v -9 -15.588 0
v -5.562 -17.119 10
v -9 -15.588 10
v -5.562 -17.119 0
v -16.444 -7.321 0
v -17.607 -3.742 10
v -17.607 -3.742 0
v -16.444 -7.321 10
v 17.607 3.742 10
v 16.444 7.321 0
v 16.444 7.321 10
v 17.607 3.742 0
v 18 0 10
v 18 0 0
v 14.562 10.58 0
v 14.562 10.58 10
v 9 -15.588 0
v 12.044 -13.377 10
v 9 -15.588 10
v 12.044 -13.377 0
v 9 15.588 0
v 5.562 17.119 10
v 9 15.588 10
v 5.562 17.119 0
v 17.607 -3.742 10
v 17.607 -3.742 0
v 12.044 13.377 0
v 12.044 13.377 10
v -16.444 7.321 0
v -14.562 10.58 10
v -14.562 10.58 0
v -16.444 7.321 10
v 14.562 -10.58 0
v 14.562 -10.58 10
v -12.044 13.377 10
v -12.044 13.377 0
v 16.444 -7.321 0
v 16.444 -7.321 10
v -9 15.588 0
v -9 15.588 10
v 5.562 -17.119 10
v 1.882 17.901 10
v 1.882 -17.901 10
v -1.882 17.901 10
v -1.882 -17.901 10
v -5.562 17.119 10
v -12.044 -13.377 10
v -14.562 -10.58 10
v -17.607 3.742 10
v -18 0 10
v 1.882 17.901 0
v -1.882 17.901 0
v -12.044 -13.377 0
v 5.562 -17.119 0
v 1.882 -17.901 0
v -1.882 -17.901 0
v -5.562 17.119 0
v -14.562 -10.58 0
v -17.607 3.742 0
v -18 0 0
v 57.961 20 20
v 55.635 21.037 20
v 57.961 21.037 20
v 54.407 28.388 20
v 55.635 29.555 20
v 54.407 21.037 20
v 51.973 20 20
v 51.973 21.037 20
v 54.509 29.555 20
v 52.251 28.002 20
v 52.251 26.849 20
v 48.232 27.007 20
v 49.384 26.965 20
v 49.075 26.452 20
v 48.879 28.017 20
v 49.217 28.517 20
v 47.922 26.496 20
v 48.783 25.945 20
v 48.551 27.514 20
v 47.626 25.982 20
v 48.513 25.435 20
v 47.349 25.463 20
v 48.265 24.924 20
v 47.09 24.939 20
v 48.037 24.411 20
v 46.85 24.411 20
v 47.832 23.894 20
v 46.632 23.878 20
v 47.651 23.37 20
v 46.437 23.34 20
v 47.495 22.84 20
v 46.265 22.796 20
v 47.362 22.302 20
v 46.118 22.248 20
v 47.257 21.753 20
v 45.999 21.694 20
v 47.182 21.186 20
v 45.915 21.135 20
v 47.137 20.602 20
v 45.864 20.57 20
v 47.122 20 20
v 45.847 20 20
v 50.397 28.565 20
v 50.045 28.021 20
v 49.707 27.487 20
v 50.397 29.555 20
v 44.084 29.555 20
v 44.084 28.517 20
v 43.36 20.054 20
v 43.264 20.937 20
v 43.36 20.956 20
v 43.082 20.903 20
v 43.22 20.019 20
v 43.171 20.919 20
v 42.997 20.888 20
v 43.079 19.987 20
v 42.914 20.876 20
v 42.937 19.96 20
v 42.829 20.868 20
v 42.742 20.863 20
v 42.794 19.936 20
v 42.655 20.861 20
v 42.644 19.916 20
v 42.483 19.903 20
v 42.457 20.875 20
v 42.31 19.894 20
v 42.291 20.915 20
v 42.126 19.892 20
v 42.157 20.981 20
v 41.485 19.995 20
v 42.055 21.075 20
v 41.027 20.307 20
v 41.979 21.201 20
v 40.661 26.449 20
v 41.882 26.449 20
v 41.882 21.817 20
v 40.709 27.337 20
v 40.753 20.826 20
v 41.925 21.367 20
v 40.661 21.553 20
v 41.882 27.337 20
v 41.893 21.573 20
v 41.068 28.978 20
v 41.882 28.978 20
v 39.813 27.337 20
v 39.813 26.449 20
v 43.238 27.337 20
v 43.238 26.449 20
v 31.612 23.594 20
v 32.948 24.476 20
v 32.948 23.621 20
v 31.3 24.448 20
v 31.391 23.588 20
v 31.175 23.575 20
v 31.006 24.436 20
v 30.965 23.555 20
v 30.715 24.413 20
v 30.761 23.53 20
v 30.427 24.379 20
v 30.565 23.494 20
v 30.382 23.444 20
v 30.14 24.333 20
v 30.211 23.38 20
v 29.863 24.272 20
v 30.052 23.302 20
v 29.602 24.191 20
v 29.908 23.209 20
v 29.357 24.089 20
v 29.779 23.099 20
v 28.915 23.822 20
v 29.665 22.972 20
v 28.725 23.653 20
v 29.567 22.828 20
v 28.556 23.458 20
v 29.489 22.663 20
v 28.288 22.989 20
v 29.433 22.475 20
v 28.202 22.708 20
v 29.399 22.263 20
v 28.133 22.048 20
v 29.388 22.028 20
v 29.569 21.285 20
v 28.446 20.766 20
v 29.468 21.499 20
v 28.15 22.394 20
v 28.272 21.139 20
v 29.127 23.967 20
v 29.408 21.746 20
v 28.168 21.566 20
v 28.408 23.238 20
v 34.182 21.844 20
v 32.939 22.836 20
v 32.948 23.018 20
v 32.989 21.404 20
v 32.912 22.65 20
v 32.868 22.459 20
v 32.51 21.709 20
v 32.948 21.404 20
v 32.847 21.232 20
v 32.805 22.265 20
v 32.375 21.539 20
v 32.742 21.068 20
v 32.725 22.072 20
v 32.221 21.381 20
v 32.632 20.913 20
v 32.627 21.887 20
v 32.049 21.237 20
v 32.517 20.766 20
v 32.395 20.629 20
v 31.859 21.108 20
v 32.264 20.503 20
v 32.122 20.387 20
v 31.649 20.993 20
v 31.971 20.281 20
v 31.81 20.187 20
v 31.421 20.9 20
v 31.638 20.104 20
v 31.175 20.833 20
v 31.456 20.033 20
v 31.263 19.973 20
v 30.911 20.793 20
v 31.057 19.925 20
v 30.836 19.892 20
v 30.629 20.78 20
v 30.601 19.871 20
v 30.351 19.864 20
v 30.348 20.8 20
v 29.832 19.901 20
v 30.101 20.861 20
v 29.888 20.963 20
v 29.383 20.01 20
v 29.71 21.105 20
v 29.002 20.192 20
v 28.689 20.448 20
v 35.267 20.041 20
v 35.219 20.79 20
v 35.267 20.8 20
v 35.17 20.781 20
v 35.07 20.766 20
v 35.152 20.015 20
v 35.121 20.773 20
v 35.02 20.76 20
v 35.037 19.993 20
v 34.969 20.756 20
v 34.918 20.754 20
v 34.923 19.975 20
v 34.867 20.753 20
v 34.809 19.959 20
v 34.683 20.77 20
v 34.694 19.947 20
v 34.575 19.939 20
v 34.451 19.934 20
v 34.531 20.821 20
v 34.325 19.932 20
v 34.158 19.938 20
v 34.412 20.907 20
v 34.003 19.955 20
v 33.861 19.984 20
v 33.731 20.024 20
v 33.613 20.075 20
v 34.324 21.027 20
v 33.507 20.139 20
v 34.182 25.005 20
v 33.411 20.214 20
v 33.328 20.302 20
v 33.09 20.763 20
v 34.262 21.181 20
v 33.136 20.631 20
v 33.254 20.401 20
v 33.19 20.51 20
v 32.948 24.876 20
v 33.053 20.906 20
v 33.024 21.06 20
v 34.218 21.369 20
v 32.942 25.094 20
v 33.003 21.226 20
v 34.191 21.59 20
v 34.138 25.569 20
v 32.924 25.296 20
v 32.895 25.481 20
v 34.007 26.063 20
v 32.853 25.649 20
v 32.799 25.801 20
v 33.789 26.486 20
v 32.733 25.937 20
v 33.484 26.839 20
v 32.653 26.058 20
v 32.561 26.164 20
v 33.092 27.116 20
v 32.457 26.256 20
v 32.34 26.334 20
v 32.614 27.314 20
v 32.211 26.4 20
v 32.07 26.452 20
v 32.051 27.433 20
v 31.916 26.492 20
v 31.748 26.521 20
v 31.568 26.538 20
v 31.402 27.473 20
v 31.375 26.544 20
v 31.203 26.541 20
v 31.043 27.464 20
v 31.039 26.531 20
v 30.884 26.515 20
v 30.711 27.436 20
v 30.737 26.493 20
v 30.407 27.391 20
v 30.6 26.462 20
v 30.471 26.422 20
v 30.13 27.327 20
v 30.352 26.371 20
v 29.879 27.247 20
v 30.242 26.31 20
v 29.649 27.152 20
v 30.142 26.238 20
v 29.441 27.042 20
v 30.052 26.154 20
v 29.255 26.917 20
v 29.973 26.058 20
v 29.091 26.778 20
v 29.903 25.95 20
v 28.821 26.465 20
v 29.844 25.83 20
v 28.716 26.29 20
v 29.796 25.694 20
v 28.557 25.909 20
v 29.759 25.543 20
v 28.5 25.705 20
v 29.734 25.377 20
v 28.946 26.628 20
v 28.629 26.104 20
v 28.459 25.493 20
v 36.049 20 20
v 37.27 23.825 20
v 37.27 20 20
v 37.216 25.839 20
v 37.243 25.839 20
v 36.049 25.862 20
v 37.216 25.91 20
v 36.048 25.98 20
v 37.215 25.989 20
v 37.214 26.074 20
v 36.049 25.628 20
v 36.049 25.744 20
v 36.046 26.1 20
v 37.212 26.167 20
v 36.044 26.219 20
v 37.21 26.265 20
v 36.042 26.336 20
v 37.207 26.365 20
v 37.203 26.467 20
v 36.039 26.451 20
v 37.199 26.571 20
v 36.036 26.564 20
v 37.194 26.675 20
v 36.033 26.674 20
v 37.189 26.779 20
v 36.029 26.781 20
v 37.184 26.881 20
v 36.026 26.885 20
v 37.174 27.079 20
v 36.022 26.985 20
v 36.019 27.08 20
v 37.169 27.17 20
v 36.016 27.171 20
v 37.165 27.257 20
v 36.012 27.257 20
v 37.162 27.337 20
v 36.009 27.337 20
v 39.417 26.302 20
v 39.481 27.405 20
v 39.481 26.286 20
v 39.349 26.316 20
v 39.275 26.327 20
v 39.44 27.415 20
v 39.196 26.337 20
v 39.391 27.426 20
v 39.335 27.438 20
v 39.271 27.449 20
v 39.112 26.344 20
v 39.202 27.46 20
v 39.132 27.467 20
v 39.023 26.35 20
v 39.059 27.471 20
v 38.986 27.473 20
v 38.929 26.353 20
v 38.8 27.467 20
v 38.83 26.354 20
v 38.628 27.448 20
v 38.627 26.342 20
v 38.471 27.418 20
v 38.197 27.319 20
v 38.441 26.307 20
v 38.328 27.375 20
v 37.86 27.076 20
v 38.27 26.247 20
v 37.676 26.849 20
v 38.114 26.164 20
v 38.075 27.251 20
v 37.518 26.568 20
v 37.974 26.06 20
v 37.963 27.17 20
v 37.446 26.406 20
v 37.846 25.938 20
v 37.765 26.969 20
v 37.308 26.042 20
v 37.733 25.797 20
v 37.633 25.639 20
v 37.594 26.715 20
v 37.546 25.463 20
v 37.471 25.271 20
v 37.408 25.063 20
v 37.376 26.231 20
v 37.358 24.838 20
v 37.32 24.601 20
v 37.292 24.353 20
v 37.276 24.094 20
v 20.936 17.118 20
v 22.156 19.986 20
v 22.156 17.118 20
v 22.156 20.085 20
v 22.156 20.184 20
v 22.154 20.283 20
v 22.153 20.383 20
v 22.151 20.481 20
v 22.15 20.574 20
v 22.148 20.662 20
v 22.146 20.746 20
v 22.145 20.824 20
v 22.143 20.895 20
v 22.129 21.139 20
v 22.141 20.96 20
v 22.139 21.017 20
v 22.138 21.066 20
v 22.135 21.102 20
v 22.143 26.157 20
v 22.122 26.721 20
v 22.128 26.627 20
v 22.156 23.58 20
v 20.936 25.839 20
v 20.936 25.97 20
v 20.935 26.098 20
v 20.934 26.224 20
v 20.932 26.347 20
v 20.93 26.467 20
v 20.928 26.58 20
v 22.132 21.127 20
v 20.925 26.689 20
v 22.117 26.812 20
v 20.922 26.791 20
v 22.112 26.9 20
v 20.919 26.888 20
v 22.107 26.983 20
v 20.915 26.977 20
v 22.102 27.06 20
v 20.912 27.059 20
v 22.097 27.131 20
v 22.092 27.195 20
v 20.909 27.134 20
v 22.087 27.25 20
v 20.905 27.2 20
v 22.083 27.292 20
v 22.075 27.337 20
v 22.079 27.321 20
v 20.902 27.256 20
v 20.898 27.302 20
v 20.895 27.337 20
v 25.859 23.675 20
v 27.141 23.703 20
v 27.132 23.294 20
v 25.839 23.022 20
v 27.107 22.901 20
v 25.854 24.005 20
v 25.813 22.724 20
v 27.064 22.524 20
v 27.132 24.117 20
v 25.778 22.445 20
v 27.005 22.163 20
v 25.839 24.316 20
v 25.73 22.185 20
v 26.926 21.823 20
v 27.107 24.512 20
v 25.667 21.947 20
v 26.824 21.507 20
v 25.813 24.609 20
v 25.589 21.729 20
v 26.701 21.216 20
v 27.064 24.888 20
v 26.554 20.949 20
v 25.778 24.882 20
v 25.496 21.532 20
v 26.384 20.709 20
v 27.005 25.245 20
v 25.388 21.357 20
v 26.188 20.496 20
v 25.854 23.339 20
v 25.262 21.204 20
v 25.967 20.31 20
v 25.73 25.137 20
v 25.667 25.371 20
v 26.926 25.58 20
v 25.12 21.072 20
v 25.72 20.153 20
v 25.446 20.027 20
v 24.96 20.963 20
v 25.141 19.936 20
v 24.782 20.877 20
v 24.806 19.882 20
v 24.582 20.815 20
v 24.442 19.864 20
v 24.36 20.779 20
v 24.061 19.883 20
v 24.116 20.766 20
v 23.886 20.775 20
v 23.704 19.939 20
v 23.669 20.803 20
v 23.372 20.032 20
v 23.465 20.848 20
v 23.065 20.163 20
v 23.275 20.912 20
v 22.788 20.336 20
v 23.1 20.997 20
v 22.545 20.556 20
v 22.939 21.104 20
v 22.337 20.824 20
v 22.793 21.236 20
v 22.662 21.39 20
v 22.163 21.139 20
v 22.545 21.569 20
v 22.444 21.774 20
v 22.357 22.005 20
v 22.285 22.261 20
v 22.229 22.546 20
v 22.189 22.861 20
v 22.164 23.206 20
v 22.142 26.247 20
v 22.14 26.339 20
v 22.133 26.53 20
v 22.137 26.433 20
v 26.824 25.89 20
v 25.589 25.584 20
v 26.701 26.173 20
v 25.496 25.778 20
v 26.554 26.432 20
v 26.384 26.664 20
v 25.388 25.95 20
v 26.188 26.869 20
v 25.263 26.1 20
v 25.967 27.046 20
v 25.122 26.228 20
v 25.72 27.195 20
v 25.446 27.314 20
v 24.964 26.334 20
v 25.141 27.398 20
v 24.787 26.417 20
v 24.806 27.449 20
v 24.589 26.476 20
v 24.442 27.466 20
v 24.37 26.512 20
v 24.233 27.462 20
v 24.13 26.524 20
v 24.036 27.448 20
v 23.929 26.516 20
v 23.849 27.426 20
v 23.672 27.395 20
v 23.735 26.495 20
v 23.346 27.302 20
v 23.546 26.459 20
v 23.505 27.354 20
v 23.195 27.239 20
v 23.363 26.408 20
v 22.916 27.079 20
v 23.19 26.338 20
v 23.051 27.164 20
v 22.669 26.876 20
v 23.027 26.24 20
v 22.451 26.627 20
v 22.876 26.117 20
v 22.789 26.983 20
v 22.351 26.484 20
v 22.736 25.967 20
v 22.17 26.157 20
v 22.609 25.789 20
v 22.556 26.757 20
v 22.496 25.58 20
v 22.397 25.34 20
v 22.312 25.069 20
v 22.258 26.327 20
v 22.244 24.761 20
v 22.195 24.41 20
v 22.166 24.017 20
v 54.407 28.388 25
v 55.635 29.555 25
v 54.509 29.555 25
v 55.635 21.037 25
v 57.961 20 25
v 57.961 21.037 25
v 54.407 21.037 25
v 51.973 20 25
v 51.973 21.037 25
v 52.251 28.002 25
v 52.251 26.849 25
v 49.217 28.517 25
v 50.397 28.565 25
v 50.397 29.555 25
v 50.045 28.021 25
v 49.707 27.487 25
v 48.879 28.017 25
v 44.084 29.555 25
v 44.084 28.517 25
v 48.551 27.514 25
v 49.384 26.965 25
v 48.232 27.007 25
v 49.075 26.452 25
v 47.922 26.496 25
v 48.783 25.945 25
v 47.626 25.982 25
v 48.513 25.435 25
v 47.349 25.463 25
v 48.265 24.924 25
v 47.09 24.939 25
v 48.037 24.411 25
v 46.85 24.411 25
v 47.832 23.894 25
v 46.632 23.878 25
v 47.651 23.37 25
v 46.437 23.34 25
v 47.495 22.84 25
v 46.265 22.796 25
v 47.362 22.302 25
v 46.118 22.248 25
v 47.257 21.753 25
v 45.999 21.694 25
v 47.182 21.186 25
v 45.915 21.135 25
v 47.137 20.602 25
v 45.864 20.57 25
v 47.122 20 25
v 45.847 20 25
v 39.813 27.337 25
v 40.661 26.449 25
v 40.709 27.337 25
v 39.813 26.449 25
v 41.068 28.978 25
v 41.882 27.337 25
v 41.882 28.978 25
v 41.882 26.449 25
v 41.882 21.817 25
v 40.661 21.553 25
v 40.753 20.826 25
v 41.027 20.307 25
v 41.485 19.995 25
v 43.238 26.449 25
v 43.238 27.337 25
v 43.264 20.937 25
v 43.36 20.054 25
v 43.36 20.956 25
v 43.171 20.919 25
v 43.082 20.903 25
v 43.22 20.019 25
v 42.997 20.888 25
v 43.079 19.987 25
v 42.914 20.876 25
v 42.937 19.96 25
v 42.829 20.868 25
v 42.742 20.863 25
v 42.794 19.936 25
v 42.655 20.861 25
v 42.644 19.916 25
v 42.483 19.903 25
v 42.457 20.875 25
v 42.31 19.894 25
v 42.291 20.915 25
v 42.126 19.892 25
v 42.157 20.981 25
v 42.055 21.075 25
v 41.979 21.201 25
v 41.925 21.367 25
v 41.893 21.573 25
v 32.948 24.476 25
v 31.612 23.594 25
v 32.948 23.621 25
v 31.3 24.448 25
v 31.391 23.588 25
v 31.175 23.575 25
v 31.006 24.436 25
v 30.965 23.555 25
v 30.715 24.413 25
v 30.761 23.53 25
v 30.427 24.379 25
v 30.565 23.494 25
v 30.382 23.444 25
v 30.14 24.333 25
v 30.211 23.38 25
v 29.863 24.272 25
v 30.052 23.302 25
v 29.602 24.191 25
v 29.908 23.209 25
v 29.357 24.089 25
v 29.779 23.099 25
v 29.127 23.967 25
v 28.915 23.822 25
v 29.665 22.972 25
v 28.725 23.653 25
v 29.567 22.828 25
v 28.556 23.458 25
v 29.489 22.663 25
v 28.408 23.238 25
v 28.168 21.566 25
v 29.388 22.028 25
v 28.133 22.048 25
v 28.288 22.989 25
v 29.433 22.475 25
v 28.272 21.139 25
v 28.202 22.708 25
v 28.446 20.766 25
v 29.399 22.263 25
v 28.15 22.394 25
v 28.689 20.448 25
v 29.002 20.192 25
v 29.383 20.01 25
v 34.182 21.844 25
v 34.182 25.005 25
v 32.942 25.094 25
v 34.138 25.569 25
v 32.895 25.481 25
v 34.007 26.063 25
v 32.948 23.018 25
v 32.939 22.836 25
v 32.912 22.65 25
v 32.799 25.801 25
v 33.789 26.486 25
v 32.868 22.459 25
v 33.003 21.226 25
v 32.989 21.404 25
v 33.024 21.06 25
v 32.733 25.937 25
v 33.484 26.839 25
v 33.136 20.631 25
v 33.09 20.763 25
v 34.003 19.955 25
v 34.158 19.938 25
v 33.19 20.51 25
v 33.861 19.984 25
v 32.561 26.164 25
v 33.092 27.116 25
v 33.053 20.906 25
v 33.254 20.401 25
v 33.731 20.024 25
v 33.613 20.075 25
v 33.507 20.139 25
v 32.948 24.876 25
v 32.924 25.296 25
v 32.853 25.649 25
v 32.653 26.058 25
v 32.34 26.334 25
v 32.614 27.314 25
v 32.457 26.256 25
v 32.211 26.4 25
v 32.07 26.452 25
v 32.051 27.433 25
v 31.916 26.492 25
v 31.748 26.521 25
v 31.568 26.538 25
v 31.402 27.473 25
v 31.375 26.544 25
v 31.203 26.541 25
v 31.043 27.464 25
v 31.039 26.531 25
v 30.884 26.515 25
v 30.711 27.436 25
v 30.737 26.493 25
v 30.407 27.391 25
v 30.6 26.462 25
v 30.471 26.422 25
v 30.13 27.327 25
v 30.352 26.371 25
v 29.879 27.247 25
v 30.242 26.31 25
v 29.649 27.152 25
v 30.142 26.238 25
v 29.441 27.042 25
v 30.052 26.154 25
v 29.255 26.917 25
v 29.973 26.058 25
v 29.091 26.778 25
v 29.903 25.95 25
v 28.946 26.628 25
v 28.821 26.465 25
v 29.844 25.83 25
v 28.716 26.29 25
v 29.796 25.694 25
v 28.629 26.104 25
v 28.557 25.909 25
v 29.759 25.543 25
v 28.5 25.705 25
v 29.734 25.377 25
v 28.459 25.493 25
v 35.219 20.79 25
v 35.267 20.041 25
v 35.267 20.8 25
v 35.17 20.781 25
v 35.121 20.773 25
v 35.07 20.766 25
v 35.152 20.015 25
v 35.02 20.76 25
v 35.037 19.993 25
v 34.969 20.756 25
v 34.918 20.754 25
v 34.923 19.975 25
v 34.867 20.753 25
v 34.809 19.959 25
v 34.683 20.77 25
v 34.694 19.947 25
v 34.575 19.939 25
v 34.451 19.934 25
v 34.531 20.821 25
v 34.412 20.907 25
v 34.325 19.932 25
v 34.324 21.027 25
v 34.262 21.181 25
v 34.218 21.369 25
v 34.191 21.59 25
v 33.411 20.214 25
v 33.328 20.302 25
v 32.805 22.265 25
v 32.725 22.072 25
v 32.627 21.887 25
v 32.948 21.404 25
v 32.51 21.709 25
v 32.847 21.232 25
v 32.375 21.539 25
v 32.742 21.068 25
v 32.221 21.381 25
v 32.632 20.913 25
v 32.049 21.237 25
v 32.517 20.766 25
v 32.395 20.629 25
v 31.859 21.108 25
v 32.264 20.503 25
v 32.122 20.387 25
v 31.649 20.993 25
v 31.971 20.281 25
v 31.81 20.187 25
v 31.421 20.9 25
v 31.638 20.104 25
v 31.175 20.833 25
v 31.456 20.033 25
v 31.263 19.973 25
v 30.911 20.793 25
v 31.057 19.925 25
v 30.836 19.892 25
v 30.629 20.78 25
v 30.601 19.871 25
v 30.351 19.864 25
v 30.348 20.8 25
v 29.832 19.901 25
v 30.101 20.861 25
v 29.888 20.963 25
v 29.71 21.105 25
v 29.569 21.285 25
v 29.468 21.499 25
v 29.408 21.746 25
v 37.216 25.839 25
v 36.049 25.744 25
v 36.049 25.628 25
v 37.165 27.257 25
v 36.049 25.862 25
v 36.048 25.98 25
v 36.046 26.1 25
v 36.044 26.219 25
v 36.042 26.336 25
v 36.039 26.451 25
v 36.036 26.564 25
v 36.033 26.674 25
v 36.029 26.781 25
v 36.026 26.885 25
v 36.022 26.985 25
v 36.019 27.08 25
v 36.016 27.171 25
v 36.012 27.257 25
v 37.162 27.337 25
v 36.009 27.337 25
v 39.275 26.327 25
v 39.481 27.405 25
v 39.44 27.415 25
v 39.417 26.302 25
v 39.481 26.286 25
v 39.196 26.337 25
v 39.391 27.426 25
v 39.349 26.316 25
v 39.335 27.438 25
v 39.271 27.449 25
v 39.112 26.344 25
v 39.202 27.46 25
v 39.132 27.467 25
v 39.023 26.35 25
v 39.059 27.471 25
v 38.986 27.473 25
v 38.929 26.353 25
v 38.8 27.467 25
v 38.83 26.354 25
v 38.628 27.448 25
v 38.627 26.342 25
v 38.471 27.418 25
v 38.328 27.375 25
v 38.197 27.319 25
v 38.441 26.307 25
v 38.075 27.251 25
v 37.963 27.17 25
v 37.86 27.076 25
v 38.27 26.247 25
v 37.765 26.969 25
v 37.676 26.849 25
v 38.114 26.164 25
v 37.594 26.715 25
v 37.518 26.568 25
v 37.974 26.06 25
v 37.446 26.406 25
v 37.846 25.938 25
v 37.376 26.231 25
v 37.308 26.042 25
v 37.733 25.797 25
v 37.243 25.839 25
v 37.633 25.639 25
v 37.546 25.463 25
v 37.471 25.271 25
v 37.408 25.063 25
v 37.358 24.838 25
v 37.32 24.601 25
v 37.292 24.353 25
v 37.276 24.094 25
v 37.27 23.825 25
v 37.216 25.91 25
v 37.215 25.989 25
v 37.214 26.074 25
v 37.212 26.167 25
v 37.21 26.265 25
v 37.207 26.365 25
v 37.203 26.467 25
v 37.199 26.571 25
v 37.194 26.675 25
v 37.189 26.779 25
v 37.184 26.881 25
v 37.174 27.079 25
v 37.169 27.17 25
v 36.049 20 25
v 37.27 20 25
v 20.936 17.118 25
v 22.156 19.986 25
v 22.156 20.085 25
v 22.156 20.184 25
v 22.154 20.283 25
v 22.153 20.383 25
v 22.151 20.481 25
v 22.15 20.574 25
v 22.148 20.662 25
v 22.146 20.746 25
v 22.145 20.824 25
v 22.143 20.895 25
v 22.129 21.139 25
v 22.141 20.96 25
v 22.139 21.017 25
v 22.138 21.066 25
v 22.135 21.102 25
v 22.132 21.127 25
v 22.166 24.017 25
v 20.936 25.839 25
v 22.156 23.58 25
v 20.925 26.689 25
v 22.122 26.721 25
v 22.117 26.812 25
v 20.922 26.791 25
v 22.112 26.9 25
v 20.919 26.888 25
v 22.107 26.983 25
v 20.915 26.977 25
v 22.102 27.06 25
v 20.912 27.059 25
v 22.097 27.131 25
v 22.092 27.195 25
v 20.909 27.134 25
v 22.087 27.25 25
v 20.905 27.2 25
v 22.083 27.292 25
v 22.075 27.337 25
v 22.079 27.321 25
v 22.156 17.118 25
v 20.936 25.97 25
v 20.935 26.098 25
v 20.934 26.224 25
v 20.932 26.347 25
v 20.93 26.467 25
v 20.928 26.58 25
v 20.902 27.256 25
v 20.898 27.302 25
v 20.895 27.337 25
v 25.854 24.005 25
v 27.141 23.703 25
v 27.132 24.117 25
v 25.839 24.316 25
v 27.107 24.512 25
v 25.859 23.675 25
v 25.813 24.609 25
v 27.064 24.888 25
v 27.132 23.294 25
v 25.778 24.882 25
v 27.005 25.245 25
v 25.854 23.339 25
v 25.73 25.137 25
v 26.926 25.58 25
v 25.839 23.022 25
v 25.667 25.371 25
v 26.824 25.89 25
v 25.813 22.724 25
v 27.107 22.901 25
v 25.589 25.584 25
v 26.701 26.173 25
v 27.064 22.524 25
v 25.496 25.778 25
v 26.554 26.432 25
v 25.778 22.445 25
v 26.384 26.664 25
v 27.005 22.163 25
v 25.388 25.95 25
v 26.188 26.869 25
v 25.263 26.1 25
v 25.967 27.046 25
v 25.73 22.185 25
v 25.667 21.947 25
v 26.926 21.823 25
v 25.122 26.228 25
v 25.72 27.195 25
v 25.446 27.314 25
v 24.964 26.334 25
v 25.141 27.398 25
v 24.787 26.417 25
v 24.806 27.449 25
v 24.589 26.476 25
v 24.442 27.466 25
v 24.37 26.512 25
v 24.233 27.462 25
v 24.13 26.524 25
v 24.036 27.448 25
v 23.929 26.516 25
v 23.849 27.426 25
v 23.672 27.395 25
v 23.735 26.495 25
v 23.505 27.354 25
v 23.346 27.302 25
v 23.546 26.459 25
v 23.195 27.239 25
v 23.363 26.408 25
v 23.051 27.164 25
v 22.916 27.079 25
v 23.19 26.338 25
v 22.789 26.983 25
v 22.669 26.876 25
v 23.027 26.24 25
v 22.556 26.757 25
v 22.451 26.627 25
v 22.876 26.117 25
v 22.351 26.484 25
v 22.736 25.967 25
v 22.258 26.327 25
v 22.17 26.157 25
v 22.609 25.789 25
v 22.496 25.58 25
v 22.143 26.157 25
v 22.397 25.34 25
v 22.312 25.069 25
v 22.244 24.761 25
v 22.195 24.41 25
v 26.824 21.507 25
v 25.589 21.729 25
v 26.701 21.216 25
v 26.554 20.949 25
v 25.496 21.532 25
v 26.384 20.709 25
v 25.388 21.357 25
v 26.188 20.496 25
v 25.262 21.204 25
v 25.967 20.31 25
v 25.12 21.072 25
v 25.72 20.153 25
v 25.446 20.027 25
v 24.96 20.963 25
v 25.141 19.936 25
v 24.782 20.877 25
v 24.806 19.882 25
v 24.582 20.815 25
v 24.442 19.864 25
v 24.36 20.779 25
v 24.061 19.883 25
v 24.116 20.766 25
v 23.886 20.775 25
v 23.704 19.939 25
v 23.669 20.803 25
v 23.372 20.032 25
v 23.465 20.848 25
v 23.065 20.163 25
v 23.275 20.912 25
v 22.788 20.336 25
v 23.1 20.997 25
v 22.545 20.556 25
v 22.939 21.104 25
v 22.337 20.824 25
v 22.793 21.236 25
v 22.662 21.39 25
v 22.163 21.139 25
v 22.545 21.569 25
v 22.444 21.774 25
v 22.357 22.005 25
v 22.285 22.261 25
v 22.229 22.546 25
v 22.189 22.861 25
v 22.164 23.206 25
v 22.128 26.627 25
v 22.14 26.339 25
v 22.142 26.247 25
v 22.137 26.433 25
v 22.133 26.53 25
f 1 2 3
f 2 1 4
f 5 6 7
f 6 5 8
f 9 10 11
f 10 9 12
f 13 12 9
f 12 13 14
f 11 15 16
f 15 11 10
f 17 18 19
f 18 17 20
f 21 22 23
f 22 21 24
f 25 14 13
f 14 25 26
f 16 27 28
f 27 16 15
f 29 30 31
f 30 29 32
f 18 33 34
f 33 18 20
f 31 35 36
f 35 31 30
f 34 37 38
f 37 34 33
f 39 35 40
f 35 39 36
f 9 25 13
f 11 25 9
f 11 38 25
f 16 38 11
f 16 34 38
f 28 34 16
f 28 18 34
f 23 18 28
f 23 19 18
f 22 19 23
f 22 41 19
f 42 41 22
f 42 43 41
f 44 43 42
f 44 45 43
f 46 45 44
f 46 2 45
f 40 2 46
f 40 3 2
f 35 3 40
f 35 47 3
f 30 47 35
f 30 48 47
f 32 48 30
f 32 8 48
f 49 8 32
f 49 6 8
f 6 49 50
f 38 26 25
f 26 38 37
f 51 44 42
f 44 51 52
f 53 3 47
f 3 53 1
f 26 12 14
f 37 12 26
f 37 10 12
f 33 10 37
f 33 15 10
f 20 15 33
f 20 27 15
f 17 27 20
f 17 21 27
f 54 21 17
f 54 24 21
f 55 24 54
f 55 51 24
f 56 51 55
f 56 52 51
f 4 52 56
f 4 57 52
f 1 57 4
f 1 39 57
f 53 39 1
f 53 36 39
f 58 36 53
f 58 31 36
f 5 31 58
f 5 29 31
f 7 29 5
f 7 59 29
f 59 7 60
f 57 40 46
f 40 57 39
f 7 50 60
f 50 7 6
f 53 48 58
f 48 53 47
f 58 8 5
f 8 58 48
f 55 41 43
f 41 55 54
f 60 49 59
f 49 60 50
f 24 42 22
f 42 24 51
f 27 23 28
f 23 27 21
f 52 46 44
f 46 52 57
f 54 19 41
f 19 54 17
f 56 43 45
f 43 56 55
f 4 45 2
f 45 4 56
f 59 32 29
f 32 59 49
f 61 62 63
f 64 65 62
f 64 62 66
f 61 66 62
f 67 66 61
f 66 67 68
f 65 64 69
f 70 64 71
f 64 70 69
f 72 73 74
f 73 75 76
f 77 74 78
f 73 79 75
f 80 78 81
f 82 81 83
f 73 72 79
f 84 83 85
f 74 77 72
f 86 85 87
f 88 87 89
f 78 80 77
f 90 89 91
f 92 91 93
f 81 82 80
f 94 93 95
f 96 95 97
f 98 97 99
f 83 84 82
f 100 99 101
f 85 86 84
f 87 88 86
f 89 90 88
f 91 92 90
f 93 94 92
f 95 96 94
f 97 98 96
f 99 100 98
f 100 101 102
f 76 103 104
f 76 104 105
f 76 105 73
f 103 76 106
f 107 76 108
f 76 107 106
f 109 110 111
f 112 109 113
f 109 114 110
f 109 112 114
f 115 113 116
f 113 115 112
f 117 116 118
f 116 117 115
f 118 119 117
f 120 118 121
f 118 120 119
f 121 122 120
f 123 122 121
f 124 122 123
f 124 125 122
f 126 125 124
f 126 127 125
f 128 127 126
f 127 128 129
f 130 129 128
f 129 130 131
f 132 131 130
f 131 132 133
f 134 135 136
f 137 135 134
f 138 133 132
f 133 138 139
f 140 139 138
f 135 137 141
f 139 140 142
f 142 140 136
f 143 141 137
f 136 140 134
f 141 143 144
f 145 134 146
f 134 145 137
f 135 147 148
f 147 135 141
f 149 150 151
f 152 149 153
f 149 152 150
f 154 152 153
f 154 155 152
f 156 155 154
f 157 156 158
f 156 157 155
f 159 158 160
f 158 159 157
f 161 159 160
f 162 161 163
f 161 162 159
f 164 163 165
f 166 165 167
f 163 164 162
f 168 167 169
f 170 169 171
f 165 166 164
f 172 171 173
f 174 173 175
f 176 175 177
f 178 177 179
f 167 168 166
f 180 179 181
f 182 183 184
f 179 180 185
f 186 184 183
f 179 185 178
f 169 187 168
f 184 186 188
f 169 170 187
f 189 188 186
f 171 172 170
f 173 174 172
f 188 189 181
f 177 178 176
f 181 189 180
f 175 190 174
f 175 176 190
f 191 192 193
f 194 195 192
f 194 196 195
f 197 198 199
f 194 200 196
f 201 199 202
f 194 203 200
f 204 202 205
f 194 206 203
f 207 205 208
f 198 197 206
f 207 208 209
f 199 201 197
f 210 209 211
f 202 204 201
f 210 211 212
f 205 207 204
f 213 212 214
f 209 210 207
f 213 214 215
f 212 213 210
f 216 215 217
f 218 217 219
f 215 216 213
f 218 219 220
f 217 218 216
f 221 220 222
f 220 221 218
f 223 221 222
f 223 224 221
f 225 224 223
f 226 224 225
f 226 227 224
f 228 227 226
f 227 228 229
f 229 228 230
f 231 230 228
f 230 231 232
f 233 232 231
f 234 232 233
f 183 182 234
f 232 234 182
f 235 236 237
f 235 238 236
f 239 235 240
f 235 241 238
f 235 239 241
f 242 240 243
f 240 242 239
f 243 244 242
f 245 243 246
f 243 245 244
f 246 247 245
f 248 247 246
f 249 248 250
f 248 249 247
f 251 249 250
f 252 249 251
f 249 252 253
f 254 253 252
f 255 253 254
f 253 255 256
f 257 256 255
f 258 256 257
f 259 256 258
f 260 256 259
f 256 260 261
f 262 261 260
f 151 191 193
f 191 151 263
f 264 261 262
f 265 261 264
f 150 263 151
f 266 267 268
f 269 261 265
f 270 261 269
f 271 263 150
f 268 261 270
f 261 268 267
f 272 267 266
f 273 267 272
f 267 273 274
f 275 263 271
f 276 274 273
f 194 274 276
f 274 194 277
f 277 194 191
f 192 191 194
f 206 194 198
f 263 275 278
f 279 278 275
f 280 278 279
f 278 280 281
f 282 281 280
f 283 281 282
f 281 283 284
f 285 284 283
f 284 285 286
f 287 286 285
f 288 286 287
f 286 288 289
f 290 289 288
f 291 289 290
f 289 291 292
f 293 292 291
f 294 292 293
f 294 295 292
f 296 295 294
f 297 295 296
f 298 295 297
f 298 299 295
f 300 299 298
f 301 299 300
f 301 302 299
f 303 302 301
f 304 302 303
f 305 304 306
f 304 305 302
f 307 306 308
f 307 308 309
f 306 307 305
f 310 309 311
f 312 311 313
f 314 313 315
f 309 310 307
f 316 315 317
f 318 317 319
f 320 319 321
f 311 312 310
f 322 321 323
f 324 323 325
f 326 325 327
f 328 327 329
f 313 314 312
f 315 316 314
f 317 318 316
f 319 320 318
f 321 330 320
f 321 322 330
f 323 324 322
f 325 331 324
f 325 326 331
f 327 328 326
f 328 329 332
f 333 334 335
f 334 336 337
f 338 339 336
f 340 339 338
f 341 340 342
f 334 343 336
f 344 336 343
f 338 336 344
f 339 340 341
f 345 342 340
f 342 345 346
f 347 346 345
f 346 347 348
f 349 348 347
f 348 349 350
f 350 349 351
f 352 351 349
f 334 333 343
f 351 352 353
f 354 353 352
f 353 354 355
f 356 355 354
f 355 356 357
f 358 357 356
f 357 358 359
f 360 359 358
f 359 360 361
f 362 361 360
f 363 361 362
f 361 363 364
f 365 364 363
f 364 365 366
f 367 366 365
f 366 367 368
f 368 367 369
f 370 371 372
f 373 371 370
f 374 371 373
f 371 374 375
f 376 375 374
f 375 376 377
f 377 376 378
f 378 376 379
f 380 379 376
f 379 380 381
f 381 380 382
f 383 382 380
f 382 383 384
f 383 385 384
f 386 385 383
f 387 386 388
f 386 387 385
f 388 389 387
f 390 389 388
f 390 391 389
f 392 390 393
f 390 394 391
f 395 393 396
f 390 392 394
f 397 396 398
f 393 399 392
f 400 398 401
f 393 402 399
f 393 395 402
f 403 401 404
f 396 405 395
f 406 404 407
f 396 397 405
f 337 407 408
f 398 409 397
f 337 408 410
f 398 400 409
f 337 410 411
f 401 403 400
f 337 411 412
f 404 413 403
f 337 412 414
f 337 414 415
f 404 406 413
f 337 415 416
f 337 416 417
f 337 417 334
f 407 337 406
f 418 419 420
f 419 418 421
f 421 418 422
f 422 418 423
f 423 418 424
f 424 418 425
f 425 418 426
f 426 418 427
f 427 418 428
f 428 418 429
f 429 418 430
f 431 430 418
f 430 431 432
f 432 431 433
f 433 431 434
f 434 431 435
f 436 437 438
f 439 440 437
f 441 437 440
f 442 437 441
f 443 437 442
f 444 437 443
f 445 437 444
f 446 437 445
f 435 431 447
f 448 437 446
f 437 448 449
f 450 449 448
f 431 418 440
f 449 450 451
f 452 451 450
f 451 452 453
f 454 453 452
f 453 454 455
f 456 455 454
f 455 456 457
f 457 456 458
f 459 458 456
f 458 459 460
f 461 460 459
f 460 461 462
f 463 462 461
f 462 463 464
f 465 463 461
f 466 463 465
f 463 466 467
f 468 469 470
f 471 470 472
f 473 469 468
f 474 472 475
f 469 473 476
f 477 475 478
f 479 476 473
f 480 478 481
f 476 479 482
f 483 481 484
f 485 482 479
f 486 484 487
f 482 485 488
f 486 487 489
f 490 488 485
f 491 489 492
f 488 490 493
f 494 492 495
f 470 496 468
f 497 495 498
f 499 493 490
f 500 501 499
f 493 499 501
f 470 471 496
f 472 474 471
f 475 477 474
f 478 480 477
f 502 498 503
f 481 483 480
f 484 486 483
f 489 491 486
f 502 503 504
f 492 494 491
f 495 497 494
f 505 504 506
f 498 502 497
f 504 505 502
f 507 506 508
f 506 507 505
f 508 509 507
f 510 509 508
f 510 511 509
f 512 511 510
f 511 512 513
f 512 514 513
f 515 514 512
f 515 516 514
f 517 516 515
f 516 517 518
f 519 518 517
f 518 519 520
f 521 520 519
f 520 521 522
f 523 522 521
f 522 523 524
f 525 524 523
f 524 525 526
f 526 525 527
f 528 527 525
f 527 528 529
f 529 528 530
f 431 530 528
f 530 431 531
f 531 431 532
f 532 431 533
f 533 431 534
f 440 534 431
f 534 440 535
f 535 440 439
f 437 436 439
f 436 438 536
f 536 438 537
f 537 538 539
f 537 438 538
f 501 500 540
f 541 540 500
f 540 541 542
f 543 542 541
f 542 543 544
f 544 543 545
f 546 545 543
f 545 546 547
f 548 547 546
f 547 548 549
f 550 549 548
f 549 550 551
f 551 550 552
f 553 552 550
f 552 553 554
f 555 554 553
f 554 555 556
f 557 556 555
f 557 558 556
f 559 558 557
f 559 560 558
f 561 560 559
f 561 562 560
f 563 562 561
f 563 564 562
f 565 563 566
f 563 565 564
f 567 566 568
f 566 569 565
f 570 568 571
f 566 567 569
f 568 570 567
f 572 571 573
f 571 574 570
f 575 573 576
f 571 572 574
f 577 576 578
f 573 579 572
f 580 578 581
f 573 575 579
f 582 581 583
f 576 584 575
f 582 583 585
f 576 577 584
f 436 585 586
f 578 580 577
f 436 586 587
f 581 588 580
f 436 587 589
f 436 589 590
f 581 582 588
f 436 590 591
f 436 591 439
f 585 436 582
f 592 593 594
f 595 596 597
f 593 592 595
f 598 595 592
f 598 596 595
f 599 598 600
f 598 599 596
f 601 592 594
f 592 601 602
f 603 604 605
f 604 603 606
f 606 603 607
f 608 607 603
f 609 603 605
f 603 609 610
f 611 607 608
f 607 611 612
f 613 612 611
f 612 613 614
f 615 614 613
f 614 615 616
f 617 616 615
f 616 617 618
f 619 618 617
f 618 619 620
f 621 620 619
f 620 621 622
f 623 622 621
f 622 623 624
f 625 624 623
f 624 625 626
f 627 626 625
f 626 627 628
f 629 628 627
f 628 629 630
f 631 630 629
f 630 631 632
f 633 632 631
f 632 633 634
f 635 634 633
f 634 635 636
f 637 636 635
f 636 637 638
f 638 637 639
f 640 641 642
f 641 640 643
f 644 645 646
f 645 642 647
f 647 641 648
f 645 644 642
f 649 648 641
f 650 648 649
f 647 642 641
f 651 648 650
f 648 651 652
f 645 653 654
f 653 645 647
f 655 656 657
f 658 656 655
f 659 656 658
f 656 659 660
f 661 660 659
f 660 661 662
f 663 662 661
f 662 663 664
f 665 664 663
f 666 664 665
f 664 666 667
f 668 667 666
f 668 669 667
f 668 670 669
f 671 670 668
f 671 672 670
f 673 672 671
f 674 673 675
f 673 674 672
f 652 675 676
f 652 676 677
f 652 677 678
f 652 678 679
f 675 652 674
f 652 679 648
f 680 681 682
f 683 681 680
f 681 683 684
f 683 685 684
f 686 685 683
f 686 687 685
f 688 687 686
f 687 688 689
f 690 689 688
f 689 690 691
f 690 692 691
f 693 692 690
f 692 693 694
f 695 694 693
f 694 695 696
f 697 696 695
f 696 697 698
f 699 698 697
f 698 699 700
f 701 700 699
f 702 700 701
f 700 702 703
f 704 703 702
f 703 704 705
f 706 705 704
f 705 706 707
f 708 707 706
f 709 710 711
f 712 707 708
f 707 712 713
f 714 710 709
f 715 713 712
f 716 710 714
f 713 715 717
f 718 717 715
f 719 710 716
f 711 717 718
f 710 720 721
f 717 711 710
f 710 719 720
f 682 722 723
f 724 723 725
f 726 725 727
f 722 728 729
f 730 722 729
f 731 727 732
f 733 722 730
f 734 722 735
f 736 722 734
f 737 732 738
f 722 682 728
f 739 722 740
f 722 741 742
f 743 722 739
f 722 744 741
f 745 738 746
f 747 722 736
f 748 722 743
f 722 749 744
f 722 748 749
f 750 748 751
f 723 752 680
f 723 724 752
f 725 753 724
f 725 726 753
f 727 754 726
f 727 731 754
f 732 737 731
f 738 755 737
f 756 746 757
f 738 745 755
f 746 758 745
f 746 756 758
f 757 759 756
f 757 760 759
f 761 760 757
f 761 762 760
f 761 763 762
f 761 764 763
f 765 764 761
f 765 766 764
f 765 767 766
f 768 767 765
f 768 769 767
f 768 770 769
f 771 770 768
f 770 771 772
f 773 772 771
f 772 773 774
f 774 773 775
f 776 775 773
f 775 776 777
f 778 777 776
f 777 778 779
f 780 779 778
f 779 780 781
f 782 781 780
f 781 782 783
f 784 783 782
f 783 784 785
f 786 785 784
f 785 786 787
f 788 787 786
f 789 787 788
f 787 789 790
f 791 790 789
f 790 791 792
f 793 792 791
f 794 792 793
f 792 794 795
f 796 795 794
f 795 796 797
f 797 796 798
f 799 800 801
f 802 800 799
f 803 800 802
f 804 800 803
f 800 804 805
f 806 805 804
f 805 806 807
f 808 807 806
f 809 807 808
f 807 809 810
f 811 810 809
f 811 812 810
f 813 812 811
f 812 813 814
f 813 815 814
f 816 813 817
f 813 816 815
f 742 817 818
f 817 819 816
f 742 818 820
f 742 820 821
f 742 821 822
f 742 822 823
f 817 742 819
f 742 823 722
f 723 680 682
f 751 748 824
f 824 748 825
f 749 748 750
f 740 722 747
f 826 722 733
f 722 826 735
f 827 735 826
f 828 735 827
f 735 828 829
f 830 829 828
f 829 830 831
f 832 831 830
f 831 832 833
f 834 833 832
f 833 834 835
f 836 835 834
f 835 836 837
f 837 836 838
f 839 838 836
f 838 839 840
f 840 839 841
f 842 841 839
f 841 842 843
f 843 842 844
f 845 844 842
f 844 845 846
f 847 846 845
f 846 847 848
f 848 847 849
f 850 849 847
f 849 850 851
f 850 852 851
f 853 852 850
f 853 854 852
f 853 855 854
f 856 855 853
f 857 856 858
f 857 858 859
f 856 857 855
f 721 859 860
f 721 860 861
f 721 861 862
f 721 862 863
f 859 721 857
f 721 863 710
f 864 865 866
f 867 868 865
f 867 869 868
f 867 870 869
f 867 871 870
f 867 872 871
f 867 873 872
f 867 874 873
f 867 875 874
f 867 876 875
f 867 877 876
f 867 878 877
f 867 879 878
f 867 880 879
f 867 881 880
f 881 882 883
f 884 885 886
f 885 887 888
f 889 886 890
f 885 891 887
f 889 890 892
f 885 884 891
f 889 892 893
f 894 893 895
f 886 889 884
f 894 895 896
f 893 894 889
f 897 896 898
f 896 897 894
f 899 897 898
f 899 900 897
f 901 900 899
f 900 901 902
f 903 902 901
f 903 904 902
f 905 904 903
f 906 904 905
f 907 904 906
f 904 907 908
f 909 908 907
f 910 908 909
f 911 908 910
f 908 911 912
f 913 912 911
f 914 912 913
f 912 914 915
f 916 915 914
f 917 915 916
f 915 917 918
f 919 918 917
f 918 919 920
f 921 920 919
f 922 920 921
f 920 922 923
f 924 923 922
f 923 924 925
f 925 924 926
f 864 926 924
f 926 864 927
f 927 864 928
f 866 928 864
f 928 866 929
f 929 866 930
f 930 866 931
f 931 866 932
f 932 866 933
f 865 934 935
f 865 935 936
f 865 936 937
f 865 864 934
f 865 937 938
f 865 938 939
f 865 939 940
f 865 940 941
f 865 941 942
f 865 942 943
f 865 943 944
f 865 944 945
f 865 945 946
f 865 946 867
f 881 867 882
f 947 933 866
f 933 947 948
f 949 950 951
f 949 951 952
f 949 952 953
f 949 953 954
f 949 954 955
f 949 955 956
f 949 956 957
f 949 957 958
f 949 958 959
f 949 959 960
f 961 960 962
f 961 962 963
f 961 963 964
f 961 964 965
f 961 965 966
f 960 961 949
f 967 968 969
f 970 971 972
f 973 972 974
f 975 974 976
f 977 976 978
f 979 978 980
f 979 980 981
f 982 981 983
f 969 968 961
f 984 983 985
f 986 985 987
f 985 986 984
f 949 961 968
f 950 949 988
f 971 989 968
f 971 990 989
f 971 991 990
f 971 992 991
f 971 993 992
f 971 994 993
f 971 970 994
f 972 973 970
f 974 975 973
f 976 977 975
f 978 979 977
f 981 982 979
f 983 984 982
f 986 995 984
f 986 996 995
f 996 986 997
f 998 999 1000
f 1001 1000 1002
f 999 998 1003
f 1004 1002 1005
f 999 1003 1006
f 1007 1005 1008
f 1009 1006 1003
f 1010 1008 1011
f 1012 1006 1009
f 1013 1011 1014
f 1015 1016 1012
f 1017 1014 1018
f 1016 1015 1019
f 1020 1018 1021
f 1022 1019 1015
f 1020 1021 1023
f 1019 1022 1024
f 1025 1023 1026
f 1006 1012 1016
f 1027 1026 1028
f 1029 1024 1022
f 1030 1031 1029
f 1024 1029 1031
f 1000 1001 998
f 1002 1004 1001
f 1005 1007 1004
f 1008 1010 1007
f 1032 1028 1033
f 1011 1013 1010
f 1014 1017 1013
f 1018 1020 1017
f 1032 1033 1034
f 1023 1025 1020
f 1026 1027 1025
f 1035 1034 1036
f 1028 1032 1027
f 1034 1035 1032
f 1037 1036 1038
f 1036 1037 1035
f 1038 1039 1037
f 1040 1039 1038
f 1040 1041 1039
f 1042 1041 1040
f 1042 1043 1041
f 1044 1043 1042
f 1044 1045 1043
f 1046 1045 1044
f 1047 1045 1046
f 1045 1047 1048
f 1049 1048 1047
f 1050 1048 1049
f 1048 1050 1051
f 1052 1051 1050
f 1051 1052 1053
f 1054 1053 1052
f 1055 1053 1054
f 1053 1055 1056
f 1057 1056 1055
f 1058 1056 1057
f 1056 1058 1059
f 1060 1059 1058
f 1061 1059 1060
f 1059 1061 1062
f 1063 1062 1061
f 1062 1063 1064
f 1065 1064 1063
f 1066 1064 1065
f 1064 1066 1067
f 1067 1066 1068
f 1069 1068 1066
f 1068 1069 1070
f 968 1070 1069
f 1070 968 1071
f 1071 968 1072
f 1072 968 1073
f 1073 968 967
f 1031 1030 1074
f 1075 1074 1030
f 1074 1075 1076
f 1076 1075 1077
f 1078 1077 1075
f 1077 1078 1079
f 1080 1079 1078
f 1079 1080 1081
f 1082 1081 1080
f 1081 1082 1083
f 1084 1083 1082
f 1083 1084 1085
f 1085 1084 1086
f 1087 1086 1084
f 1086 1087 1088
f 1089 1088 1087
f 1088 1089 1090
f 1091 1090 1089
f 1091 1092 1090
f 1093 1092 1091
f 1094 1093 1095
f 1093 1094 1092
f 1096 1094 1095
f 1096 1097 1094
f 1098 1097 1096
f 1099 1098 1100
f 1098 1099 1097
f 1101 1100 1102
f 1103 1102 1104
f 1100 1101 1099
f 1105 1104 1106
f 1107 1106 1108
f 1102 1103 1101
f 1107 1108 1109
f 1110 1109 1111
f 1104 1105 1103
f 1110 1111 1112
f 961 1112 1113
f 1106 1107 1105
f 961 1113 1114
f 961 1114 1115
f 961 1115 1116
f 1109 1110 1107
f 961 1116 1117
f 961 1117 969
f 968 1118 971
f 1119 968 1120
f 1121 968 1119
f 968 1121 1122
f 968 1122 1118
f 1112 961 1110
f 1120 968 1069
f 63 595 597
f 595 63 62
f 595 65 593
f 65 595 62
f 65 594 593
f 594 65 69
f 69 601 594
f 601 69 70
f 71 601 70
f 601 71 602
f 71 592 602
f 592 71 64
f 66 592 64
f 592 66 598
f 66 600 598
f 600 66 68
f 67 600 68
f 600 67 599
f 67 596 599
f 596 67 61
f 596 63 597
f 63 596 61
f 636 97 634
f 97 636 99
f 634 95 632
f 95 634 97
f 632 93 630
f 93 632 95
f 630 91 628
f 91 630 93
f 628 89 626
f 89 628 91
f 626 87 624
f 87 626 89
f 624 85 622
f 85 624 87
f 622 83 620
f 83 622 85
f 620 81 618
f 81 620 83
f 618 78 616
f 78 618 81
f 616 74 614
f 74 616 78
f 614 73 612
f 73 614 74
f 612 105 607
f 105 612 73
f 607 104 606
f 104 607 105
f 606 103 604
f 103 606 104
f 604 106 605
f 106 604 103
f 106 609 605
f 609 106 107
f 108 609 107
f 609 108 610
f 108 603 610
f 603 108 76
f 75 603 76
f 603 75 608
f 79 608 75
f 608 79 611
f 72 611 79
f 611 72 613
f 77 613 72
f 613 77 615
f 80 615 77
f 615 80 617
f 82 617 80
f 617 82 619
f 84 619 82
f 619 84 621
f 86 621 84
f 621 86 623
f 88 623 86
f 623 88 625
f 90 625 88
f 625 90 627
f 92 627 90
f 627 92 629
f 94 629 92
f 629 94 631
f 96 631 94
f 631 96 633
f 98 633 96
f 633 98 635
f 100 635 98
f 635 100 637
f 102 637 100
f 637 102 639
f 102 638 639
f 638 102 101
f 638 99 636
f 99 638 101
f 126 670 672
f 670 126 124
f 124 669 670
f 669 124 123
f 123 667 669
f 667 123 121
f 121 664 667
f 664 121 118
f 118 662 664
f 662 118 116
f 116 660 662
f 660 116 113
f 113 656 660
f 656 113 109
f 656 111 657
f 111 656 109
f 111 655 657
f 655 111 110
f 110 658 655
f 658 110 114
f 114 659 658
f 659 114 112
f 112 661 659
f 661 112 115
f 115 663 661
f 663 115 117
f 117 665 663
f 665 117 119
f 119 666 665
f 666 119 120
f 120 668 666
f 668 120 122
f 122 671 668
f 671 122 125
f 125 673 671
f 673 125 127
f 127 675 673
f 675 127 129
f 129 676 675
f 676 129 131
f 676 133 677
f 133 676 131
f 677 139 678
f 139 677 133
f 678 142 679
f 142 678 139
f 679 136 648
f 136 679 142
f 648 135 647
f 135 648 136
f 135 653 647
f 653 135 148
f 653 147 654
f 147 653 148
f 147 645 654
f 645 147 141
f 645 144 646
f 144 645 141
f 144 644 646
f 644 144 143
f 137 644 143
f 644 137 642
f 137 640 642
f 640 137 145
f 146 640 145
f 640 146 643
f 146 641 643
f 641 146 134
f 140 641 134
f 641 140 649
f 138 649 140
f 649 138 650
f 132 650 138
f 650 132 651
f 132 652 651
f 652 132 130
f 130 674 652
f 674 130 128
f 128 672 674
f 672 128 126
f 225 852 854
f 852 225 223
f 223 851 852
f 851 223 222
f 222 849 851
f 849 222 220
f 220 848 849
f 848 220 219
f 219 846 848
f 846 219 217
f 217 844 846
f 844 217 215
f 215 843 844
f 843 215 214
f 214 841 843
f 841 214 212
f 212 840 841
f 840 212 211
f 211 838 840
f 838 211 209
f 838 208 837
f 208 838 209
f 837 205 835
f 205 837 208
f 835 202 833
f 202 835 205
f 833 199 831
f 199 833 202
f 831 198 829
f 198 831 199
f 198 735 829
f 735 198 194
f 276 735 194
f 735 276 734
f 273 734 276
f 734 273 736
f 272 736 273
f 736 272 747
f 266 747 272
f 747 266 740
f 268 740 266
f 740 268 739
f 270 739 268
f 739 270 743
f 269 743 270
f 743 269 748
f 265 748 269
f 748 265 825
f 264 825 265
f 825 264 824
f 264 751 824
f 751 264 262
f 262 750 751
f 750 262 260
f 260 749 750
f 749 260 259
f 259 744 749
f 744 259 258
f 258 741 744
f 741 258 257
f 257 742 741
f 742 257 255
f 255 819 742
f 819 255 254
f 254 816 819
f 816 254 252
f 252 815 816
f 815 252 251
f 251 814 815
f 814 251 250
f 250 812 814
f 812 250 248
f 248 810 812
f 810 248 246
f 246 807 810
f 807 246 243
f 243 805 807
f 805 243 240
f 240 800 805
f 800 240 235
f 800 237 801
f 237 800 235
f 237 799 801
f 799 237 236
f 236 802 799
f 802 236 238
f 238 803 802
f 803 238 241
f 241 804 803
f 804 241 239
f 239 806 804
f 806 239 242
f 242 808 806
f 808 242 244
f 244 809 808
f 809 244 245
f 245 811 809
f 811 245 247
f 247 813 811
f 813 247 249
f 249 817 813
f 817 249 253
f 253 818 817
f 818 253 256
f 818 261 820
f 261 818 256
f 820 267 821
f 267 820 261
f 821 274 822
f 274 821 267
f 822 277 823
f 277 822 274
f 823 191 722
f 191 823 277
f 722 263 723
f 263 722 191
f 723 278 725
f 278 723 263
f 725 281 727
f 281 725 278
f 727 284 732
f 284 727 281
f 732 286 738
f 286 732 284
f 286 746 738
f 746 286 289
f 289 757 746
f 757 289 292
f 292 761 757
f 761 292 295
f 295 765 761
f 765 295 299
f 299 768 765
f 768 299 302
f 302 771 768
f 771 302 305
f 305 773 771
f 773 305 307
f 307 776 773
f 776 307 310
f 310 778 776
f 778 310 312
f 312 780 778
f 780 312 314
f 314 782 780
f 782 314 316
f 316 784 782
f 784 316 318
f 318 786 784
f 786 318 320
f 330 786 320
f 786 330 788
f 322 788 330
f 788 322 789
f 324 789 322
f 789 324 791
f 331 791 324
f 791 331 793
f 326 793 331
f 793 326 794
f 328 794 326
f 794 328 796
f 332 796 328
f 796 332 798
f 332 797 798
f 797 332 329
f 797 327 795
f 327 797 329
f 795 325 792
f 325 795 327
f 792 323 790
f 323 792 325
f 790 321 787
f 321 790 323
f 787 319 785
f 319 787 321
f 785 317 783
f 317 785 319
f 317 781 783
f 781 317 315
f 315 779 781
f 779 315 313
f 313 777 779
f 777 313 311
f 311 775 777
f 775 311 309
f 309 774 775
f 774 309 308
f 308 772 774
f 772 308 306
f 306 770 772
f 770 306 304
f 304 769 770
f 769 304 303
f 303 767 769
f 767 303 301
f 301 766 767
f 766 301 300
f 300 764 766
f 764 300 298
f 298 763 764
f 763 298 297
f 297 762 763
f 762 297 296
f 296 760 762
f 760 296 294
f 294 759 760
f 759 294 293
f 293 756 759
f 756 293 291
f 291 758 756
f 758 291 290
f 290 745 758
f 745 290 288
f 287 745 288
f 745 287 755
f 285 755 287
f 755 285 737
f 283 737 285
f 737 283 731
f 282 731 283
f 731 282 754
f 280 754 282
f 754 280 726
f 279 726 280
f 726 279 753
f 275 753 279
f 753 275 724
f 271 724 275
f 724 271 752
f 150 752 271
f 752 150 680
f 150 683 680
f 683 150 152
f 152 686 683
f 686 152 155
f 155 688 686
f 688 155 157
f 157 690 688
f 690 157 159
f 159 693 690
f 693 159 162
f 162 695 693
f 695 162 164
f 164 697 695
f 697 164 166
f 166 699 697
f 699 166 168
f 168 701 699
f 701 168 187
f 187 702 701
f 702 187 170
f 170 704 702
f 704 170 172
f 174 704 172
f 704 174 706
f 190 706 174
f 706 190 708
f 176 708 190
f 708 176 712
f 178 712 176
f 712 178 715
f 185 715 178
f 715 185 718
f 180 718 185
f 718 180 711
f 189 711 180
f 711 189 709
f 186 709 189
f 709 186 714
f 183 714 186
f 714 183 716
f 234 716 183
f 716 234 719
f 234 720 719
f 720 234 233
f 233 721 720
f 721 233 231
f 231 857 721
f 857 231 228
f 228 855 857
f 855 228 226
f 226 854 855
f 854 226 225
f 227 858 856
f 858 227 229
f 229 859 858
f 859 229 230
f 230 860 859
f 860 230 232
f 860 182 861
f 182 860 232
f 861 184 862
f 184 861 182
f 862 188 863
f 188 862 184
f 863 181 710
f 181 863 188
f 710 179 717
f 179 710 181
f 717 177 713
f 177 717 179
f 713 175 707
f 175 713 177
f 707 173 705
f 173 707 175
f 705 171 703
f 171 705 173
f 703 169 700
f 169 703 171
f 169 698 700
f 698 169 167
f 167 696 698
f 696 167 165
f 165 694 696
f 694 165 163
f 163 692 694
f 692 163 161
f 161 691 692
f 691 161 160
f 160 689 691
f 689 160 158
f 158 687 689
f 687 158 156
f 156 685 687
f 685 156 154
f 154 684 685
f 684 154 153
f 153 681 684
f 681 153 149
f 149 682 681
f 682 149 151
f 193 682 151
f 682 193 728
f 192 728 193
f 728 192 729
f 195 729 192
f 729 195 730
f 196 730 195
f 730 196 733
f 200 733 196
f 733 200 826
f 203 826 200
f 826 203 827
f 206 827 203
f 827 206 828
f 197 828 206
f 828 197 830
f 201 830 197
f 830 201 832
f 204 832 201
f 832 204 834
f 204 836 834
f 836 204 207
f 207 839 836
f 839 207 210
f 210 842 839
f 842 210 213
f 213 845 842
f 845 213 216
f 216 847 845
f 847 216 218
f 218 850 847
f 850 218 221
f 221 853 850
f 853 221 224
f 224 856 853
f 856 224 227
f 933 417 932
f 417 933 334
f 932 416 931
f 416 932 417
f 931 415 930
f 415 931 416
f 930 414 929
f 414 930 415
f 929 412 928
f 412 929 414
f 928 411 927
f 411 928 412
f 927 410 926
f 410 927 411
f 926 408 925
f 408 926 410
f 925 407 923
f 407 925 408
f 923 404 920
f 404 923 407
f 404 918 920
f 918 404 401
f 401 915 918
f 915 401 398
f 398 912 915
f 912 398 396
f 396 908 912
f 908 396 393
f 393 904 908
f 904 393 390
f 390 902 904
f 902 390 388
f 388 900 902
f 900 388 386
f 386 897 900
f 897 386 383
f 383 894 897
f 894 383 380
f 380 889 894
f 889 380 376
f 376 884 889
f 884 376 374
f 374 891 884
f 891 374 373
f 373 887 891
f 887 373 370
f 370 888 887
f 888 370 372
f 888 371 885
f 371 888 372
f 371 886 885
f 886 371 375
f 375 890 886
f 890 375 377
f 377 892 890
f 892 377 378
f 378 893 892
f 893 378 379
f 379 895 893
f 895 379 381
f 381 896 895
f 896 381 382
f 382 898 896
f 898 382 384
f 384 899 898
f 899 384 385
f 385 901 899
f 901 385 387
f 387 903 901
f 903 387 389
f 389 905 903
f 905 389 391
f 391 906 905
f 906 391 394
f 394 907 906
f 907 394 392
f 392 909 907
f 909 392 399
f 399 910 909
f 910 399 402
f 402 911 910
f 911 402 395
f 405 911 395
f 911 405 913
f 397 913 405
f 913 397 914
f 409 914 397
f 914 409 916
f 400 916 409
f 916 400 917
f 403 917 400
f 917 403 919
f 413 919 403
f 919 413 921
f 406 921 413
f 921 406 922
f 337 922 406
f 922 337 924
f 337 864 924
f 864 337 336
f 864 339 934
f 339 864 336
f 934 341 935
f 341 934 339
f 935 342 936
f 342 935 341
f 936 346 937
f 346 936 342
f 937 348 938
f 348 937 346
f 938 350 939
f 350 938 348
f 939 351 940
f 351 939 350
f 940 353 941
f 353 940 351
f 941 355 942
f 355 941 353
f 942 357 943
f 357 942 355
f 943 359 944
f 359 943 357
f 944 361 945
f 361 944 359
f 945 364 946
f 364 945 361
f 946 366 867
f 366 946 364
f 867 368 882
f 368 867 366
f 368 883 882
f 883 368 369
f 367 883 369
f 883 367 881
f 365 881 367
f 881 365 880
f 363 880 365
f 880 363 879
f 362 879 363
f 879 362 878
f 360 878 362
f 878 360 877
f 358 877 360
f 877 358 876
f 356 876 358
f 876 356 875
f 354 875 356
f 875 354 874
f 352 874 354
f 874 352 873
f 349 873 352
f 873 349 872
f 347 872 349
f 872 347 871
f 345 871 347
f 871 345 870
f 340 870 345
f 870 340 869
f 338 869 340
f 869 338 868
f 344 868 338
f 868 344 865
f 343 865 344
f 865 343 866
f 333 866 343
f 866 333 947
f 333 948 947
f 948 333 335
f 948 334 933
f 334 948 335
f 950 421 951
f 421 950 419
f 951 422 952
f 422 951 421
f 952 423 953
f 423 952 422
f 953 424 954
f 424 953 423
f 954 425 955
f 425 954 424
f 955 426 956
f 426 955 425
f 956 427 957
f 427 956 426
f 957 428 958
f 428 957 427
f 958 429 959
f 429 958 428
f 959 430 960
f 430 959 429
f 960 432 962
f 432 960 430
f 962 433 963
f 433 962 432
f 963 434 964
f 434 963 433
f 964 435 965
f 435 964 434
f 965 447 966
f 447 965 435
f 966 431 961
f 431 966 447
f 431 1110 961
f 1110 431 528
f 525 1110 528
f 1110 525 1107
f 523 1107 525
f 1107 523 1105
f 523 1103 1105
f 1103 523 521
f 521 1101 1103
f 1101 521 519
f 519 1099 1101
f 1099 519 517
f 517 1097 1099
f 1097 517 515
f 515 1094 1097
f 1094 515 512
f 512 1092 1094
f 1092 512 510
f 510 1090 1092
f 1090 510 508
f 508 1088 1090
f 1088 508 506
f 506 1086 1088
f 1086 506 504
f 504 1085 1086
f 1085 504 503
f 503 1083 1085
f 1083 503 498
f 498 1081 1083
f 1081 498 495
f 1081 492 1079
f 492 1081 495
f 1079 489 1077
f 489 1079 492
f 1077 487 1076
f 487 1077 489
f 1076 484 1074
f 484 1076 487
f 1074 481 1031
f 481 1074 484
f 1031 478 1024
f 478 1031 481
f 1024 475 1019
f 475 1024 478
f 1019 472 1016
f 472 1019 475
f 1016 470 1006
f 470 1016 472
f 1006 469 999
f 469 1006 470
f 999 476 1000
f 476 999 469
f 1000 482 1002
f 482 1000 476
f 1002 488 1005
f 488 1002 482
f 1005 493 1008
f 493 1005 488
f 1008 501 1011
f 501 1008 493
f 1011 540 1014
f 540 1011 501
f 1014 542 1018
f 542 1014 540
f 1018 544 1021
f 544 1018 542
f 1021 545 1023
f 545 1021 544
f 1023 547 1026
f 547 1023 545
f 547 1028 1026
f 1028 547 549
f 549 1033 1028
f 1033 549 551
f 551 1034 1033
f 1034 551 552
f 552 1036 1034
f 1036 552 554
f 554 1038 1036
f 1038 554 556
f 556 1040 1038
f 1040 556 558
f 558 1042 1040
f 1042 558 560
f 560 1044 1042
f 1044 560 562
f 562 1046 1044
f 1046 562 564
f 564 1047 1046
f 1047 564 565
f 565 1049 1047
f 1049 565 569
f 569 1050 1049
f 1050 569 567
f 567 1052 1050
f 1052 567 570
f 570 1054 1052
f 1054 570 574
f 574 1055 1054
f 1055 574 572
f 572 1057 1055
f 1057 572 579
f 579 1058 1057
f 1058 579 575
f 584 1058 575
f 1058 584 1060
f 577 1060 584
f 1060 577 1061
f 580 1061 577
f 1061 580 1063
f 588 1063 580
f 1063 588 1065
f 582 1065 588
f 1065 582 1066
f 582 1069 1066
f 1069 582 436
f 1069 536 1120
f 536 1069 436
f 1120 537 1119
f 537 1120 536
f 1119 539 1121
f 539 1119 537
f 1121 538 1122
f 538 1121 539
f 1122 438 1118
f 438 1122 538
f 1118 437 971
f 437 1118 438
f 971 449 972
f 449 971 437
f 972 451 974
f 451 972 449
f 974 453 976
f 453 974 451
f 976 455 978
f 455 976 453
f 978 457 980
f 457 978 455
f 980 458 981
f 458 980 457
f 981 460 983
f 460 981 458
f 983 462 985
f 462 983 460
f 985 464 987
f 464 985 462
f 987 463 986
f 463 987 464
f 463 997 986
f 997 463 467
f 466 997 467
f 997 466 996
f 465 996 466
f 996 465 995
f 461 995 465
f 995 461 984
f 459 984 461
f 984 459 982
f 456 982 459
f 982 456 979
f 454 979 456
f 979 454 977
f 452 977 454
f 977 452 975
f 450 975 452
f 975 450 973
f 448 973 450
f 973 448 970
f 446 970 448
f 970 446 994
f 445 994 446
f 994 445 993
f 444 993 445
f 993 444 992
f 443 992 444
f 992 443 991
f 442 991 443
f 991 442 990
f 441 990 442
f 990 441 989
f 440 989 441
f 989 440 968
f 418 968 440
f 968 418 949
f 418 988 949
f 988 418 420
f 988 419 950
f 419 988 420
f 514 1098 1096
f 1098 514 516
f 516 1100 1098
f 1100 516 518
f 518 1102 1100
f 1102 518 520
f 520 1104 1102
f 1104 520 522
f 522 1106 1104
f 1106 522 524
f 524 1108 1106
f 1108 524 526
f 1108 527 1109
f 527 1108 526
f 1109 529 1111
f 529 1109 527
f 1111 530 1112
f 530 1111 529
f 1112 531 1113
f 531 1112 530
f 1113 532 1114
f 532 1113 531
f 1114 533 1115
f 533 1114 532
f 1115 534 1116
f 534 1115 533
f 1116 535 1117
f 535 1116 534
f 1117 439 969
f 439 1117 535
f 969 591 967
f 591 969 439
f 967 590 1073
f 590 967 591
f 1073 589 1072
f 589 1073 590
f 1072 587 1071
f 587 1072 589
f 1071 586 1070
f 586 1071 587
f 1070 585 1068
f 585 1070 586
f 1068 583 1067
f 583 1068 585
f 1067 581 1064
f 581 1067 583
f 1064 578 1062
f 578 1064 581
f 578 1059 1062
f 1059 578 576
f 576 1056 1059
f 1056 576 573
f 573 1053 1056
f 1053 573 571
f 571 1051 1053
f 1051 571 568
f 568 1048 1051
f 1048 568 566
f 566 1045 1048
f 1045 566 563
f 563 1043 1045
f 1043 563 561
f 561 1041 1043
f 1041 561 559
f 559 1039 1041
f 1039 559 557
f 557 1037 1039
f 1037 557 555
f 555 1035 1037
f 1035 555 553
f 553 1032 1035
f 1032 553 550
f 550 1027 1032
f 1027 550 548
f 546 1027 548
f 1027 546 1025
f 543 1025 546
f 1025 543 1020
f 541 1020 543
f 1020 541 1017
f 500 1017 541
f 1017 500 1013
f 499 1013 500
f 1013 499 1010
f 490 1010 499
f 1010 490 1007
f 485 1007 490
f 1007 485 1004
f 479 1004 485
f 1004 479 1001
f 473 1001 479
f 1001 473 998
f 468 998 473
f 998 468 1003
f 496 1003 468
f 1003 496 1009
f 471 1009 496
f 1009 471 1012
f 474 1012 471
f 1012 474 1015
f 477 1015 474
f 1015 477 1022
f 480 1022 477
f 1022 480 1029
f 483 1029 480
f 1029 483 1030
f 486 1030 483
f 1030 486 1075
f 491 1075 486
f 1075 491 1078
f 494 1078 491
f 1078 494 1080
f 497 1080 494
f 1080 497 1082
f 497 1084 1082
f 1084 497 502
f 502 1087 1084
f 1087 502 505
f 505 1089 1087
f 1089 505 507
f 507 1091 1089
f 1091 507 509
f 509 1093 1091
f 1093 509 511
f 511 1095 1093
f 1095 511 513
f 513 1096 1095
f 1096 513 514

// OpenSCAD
//[CUSTOMIZATION]
// Height
h=10;
// Radius
r1=18;
// Message
txt="part71";
module __END_CUSTOMIZATIONS () { }
cylinder(h,r1,r1);
translate([20,20,20]) { linear_extrude(5) text(txt, font="Liberation Sans"); }
